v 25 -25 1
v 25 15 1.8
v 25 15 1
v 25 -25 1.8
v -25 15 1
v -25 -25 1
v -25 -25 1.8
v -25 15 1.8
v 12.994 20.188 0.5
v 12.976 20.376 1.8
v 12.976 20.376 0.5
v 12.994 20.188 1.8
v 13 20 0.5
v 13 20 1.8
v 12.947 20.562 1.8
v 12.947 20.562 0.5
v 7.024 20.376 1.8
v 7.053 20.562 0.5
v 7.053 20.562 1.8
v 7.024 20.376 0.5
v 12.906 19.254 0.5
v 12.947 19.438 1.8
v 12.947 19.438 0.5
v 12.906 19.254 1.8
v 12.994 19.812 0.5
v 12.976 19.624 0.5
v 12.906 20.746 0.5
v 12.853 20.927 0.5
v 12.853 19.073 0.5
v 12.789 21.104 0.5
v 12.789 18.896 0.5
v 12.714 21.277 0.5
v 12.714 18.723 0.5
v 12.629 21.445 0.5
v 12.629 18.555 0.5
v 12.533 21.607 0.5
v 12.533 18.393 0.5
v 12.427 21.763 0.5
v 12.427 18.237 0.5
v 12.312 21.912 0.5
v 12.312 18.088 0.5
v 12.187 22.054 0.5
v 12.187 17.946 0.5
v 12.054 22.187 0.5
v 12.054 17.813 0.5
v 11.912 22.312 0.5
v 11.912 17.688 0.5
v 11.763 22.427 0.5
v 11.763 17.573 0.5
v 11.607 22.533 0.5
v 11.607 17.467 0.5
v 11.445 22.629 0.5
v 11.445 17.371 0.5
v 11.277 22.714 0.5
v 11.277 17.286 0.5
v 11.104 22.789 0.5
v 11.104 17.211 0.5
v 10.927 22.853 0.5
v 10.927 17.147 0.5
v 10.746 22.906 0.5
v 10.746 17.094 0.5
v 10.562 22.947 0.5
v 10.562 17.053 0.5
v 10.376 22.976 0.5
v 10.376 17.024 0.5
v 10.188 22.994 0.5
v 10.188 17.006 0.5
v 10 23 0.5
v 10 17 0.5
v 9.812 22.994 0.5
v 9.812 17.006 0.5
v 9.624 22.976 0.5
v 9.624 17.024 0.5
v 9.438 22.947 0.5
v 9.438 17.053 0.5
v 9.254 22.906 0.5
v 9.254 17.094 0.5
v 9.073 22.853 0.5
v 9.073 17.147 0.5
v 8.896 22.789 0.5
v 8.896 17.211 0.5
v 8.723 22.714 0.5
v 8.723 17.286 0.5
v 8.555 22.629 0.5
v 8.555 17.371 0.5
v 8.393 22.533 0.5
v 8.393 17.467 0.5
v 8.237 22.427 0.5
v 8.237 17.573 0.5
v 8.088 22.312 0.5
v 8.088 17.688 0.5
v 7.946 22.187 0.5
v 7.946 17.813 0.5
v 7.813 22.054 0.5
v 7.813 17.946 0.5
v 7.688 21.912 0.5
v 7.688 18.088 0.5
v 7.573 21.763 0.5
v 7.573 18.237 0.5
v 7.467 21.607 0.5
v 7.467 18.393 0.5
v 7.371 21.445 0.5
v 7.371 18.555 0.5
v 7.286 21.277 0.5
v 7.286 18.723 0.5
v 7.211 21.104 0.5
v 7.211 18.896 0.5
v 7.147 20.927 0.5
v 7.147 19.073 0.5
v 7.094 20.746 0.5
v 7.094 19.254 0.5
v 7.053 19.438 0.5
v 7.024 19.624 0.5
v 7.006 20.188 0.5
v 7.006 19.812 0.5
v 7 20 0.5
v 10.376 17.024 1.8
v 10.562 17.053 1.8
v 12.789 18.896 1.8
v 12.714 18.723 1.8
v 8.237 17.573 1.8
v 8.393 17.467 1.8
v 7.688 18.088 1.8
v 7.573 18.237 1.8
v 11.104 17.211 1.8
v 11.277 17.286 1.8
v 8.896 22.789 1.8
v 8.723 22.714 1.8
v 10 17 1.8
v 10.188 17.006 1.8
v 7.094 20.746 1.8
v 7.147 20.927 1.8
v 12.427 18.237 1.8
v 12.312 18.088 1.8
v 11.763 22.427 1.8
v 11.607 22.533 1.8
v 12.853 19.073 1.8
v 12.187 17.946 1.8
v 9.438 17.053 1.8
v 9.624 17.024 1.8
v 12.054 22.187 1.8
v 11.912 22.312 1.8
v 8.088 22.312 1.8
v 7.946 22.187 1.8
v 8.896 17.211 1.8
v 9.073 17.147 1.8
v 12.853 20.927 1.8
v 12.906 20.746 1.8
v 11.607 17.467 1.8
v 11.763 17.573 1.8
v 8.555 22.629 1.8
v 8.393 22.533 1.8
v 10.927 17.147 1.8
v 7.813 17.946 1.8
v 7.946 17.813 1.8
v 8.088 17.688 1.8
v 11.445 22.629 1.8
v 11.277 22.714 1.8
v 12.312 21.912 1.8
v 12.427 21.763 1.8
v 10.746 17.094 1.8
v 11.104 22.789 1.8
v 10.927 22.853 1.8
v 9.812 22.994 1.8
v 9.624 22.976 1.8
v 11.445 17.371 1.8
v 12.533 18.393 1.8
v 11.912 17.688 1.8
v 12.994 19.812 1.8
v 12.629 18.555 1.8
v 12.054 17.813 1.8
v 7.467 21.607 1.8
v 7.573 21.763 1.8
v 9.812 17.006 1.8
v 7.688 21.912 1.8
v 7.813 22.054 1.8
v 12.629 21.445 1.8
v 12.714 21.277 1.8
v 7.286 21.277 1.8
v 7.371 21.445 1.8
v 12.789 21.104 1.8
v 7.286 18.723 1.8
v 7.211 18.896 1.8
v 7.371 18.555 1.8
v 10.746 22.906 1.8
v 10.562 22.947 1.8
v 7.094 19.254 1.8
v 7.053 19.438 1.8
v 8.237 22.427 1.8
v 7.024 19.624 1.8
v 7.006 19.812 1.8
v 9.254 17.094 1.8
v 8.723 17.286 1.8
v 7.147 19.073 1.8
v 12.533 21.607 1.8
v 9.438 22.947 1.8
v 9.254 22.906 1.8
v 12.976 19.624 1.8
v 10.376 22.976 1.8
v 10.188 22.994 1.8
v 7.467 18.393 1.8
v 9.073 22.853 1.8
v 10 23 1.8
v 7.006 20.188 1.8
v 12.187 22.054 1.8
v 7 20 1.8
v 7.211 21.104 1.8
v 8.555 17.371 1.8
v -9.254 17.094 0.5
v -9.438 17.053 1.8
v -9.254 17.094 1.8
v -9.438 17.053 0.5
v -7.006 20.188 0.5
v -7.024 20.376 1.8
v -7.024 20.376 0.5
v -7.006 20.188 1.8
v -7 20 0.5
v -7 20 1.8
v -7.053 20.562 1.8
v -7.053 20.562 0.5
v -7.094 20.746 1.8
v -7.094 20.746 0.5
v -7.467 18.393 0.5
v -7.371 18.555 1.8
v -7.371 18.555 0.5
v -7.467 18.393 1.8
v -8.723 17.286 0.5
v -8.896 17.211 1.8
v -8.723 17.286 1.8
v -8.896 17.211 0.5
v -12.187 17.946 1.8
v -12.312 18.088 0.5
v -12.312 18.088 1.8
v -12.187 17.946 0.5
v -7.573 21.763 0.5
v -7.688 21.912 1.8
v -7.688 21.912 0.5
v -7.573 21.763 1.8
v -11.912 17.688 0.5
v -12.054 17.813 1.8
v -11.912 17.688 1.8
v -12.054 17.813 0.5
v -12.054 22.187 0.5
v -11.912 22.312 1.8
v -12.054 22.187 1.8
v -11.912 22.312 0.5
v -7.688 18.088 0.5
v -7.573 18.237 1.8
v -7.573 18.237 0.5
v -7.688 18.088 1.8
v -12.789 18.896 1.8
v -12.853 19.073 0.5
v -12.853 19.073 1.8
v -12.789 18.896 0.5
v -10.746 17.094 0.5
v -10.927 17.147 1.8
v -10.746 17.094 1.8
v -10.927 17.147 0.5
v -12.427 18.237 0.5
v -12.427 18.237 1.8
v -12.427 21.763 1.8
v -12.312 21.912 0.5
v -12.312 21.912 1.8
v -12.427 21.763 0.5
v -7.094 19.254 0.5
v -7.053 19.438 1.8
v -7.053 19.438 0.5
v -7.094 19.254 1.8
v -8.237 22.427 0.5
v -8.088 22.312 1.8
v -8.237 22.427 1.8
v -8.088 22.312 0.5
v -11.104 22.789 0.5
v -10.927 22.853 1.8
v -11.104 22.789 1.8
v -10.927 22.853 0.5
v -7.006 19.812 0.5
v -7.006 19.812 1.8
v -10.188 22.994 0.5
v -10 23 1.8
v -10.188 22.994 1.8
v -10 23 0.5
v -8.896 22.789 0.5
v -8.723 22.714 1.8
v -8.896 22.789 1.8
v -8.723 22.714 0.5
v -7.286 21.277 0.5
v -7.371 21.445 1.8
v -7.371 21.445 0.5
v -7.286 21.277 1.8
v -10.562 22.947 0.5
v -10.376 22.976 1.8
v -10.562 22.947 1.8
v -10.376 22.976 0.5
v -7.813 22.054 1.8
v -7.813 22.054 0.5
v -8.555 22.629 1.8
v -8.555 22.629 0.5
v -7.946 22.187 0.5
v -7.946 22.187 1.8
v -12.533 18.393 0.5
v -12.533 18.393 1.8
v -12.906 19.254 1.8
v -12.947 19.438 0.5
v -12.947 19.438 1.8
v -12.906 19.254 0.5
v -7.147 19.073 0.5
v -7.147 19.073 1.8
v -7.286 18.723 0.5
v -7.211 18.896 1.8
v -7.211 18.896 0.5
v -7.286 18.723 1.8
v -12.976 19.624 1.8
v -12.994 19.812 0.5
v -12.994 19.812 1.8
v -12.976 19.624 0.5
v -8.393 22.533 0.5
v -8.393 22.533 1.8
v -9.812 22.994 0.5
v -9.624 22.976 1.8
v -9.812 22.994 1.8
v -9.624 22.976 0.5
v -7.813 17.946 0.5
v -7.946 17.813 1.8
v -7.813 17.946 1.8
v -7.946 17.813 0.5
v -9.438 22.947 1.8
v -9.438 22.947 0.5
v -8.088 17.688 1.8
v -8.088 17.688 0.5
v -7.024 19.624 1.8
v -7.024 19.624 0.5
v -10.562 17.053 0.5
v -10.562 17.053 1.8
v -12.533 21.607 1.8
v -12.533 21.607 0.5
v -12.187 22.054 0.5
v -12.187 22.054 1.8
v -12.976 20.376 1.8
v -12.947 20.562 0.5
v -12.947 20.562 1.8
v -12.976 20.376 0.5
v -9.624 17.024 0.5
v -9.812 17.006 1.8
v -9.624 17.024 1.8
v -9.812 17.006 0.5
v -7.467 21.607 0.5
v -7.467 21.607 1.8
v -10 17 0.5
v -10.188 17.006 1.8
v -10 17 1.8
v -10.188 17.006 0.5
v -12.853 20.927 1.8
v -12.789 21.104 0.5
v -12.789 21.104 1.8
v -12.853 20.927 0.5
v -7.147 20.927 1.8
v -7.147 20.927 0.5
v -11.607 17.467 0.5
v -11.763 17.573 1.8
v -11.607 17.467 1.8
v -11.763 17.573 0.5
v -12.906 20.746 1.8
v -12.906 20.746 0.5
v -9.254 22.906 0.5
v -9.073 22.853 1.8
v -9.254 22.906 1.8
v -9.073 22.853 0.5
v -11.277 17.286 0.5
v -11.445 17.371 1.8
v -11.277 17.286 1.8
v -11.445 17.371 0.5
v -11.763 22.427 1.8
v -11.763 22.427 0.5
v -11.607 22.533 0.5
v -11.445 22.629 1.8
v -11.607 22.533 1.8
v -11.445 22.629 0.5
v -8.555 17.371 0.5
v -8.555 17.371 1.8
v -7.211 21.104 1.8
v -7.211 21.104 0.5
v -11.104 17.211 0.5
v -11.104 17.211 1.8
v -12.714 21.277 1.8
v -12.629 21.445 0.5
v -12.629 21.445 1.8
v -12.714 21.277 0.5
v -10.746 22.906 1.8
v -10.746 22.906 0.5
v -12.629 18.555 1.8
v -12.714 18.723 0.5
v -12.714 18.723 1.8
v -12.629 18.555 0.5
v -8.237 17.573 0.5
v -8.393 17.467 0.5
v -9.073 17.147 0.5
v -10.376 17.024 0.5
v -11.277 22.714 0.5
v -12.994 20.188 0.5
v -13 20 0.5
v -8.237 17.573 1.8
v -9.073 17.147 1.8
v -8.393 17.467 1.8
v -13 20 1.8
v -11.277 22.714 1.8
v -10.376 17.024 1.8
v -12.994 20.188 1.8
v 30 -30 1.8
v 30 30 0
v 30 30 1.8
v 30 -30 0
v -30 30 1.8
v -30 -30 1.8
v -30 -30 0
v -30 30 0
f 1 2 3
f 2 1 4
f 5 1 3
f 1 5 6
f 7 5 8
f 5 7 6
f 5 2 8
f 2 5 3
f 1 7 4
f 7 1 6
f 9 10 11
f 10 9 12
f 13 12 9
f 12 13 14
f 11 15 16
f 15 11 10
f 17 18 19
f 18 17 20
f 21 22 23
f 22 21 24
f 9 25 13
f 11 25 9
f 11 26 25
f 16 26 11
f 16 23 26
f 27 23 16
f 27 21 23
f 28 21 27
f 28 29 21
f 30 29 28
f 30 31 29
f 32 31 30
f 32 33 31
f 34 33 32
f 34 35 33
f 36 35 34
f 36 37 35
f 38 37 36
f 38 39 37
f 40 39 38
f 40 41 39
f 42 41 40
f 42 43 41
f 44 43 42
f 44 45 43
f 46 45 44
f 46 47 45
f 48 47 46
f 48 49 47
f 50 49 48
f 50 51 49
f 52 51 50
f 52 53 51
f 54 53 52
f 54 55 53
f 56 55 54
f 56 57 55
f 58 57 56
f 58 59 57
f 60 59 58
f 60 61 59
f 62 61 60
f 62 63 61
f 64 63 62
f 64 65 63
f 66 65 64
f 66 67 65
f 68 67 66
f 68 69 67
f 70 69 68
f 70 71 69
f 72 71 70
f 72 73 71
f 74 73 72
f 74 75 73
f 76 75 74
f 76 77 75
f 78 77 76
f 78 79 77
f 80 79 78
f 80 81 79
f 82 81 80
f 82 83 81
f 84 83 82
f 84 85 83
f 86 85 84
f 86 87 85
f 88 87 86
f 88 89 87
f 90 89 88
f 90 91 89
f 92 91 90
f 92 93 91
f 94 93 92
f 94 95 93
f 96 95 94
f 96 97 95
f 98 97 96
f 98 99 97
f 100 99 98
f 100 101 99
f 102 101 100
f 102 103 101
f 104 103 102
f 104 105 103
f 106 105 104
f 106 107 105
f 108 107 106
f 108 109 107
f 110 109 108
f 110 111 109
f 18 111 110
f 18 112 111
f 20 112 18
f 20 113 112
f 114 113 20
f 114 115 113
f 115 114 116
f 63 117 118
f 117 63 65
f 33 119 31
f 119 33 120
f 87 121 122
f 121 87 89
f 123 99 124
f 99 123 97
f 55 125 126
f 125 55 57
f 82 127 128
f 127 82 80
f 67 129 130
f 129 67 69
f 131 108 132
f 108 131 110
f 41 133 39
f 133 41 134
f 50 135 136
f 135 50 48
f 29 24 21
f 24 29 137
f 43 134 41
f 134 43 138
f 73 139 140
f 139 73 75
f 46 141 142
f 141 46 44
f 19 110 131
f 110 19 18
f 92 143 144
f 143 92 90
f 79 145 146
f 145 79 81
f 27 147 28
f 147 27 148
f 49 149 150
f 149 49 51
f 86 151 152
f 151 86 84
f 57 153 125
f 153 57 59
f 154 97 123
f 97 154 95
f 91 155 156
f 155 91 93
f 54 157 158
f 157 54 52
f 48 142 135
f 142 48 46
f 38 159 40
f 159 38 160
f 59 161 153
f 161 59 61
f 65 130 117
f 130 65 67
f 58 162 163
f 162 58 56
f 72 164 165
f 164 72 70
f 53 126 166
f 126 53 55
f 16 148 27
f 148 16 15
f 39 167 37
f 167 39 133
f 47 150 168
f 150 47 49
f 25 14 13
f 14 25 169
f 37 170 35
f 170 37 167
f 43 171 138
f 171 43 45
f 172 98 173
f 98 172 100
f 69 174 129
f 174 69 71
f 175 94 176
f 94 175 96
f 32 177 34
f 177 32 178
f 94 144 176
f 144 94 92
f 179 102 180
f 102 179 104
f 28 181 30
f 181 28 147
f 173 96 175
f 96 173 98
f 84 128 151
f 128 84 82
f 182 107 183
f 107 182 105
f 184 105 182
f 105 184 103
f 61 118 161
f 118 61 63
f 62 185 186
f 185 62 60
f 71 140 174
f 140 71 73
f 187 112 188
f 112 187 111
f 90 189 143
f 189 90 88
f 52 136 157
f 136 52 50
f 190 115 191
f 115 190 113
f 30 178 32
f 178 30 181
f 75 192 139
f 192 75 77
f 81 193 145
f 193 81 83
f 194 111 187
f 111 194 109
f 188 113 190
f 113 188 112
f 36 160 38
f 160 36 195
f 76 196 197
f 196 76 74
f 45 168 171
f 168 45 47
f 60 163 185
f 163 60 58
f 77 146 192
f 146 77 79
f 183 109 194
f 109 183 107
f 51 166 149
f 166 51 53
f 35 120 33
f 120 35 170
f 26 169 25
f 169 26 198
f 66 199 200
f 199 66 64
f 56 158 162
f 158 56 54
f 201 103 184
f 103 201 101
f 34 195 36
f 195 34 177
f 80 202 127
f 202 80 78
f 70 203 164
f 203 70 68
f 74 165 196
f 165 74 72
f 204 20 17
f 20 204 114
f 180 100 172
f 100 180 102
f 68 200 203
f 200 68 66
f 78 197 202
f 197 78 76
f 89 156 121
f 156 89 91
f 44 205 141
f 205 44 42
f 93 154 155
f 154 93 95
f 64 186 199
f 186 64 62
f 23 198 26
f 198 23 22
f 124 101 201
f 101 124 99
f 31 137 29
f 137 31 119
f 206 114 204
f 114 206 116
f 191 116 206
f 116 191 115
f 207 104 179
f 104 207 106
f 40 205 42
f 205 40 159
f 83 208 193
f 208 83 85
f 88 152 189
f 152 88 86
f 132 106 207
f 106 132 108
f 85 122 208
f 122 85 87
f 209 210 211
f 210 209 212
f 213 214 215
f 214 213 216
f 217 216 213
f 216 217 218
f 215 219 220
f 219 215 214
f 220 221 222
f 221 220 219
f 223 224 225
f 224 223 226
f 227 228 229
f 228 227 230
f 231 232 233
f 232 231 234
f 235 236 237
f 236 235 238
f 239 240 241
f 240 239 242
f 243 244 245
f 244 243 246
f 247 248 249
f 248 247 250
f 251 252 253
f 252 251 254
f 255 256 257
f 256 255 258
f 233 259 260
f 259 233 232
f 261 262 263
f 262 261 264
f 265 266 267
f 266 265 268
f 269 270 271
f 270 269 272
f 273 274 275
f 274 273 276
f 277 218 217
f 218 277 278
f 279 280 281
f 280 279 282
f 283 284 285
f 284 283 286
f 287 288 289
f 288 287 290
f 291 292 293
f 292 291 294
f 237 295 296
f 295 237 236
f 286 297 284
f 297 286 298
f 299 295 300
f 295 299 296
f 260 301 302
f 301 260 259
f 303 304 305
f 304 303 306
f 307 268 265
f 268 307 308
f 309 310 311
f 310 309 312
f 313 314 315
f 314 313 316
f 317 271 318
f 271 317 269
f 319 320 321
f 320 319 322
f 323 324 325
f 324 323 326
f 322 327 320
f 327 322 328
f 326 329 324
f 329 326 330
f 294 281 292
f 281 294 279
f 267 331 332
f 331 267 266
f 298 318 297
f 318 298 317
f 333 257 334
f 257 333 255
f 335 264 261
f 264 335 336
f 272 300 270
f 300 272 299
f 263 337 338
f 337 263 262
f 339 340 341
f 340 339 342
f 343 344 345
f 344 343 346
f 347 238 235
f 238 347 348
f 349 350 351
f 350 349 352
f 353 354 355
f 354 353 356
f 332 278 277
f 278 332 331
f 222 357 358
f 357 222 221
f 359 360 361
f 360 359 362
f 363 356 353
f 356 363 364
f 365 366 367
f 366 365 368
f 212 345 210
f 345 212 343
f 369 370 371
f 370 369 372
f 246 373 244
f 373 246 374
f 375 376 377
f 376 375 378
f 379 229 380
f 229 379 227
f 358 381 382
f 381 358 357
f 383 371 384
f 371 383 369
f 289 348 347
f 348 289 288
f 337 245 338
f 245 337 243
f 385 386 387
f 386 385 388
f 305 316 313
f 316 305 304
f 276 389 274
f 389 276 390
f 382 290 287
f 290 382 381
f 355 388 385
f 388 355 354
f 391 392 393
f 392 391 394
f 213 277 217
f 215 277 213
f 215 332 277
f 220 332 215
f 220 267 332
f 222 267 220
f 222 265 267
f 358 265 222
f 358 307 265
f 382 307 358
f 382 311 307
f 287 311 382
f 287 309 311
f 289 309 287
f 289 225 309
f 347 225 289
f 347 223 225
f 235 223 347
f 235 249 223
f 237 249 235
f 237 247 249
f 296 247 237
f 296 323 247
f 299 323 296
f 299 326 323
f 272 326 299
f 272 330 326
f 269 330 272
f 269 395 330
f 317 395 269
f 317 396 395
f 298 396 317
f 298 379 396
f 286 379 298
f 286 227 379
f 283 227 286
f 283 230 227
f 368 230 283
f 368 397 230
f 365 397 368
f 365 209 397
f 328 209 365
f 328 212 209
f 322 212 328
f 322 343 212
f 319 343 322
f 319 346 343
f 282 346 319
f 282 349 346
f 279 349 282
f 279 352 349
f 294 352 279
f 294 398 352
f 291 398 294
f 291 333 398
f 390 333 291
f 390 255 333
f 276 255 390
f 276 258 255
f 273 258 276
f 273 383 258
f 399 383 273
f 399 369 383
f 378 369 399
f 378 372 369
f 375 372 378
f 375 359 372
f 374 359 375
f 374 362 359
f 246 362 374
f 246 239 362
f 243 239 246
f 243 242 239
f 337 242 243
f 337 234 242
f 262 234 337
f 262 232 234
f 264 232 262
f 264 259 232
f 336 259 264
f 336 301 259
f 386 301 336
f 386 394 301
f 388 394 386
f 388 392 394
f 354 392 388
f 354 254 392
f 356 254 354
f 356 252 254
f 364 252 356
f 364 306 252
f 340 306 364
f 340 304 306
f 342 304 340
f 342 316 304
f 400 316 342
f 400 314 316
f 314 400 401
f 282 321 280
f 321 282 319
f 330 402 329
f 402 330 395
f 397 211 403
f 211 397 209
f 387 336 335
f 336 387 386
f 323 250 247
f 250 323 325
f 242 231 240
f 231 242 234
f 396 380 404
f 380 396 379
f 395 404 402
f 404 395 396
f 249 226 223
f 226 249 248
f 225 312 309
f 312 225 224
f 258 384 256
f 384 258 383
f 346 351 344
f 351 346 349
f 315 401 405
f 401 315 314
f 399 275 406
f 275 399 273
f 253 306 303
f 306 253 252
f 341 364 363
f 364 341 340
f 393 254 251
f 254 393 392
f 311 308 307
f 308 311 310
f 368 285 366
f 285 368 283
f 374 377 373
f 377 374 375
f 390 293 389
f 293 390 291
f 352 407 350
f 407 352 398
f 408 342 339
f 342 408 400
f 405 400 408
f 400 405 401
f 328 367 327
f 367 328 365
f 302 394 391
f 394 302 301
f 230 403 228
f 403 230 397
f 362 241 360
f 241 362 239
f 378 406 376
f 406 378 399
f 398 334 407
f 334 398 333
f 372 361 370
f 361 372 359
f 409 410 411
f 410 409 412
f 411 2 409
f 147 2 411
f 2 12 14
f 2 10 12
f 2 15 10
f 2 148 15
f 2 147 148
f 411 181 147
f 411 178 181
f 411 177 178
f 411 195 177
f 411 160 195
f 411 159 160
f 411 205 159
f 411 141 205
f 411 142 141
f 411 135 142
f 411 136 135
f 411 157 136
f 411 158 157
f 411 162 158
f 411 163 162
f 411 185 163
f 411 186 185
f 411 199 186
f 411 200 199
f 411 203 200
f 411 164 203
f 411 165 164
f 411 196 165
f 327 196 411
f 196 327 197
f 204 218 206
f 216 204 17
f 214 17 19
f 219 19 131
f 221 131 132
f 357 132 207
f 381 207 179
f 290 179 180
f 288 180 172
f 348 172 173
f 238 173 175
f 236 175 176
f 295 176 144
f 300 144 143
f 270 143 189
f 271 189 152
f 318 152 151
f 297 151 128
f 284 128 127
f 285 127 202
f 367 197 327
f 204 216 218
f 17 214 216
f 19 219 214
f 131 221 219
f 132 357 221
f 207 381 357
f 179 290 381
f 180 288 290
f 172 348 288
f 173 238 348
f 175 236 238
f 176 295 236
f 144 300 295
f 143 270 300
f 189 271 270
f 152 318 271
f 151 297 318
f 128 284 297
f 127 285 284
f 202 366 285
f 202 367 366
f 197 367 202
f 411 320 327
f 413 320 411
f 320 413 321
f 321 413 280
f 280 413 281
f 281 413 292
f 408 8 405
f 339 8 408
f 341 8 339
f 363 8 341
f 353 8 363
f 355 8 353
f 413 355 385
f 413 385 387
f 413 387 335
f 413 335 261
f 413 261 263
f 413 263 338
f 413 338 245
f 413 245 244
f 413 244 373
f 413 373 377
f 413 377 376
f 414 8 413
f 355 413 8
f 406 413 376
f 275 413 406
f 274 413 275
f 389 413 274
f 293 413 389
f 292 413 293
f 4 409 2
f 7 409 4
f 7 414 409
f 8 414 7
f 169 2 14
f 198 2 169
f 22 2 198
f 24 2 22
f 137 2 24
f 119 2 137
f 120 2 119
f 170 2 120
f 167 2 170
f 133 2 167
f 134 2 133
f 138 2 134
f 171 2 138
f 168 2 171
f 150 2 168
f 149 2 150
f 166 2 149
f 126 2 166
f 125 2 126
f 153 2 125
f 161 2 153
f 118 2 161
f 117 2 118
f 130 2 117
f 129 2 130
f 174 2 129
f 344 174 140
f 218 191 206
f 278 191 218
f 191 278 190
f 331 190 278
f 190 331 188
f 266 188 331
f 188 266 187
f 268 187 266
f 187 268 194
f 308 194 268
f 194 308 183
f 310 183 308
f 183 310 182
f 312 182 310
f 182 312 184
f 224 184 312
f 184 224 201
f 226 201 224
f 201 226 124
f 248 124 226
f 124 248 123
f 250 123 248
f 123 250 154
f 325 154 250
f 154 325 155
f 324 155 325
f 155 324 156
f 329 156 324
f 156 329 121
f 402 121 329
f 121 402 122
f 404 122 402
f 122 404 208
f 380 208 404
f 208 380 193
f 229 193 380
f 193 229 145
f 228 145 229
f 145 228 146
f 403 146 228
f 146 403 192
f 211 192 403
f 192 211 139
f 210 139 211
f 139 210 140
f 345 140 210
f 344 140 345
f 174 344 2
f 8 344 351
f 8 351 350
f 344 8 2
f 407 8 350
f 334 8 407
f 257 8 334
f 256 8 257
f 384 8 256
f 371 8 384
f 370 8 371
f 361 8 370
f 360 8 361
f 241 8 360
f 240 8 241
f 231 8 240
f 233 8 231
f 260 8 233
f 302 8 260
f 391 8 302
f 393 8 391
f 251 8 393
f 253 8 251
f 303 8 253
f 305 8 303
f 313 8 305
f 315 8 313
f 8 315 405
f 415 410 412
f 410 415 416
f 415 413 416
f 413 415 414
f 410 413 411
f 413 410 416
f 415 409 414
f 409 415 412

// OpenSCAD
difference(){
	union(){ 

              
            

        translate([-30, -30,0]){
           cube([60,60,1.8], center=false);
        }                





	}
	union() {

        translate([-25, -25,1]){
           cube([50,40,1.8], center=false);
        }                

        translate([0+10,20,0.5]){
            rotate([0,0,0]){
                cylinder(h=5, r=3, $fn=100, center=false);
            }   
        }
        translate([0-10,20,0.5]){
            rotate([0,0,0]){
                cylinder(h=5, r=3, $fn=100, center=false);
            }   
        }

	}
}
